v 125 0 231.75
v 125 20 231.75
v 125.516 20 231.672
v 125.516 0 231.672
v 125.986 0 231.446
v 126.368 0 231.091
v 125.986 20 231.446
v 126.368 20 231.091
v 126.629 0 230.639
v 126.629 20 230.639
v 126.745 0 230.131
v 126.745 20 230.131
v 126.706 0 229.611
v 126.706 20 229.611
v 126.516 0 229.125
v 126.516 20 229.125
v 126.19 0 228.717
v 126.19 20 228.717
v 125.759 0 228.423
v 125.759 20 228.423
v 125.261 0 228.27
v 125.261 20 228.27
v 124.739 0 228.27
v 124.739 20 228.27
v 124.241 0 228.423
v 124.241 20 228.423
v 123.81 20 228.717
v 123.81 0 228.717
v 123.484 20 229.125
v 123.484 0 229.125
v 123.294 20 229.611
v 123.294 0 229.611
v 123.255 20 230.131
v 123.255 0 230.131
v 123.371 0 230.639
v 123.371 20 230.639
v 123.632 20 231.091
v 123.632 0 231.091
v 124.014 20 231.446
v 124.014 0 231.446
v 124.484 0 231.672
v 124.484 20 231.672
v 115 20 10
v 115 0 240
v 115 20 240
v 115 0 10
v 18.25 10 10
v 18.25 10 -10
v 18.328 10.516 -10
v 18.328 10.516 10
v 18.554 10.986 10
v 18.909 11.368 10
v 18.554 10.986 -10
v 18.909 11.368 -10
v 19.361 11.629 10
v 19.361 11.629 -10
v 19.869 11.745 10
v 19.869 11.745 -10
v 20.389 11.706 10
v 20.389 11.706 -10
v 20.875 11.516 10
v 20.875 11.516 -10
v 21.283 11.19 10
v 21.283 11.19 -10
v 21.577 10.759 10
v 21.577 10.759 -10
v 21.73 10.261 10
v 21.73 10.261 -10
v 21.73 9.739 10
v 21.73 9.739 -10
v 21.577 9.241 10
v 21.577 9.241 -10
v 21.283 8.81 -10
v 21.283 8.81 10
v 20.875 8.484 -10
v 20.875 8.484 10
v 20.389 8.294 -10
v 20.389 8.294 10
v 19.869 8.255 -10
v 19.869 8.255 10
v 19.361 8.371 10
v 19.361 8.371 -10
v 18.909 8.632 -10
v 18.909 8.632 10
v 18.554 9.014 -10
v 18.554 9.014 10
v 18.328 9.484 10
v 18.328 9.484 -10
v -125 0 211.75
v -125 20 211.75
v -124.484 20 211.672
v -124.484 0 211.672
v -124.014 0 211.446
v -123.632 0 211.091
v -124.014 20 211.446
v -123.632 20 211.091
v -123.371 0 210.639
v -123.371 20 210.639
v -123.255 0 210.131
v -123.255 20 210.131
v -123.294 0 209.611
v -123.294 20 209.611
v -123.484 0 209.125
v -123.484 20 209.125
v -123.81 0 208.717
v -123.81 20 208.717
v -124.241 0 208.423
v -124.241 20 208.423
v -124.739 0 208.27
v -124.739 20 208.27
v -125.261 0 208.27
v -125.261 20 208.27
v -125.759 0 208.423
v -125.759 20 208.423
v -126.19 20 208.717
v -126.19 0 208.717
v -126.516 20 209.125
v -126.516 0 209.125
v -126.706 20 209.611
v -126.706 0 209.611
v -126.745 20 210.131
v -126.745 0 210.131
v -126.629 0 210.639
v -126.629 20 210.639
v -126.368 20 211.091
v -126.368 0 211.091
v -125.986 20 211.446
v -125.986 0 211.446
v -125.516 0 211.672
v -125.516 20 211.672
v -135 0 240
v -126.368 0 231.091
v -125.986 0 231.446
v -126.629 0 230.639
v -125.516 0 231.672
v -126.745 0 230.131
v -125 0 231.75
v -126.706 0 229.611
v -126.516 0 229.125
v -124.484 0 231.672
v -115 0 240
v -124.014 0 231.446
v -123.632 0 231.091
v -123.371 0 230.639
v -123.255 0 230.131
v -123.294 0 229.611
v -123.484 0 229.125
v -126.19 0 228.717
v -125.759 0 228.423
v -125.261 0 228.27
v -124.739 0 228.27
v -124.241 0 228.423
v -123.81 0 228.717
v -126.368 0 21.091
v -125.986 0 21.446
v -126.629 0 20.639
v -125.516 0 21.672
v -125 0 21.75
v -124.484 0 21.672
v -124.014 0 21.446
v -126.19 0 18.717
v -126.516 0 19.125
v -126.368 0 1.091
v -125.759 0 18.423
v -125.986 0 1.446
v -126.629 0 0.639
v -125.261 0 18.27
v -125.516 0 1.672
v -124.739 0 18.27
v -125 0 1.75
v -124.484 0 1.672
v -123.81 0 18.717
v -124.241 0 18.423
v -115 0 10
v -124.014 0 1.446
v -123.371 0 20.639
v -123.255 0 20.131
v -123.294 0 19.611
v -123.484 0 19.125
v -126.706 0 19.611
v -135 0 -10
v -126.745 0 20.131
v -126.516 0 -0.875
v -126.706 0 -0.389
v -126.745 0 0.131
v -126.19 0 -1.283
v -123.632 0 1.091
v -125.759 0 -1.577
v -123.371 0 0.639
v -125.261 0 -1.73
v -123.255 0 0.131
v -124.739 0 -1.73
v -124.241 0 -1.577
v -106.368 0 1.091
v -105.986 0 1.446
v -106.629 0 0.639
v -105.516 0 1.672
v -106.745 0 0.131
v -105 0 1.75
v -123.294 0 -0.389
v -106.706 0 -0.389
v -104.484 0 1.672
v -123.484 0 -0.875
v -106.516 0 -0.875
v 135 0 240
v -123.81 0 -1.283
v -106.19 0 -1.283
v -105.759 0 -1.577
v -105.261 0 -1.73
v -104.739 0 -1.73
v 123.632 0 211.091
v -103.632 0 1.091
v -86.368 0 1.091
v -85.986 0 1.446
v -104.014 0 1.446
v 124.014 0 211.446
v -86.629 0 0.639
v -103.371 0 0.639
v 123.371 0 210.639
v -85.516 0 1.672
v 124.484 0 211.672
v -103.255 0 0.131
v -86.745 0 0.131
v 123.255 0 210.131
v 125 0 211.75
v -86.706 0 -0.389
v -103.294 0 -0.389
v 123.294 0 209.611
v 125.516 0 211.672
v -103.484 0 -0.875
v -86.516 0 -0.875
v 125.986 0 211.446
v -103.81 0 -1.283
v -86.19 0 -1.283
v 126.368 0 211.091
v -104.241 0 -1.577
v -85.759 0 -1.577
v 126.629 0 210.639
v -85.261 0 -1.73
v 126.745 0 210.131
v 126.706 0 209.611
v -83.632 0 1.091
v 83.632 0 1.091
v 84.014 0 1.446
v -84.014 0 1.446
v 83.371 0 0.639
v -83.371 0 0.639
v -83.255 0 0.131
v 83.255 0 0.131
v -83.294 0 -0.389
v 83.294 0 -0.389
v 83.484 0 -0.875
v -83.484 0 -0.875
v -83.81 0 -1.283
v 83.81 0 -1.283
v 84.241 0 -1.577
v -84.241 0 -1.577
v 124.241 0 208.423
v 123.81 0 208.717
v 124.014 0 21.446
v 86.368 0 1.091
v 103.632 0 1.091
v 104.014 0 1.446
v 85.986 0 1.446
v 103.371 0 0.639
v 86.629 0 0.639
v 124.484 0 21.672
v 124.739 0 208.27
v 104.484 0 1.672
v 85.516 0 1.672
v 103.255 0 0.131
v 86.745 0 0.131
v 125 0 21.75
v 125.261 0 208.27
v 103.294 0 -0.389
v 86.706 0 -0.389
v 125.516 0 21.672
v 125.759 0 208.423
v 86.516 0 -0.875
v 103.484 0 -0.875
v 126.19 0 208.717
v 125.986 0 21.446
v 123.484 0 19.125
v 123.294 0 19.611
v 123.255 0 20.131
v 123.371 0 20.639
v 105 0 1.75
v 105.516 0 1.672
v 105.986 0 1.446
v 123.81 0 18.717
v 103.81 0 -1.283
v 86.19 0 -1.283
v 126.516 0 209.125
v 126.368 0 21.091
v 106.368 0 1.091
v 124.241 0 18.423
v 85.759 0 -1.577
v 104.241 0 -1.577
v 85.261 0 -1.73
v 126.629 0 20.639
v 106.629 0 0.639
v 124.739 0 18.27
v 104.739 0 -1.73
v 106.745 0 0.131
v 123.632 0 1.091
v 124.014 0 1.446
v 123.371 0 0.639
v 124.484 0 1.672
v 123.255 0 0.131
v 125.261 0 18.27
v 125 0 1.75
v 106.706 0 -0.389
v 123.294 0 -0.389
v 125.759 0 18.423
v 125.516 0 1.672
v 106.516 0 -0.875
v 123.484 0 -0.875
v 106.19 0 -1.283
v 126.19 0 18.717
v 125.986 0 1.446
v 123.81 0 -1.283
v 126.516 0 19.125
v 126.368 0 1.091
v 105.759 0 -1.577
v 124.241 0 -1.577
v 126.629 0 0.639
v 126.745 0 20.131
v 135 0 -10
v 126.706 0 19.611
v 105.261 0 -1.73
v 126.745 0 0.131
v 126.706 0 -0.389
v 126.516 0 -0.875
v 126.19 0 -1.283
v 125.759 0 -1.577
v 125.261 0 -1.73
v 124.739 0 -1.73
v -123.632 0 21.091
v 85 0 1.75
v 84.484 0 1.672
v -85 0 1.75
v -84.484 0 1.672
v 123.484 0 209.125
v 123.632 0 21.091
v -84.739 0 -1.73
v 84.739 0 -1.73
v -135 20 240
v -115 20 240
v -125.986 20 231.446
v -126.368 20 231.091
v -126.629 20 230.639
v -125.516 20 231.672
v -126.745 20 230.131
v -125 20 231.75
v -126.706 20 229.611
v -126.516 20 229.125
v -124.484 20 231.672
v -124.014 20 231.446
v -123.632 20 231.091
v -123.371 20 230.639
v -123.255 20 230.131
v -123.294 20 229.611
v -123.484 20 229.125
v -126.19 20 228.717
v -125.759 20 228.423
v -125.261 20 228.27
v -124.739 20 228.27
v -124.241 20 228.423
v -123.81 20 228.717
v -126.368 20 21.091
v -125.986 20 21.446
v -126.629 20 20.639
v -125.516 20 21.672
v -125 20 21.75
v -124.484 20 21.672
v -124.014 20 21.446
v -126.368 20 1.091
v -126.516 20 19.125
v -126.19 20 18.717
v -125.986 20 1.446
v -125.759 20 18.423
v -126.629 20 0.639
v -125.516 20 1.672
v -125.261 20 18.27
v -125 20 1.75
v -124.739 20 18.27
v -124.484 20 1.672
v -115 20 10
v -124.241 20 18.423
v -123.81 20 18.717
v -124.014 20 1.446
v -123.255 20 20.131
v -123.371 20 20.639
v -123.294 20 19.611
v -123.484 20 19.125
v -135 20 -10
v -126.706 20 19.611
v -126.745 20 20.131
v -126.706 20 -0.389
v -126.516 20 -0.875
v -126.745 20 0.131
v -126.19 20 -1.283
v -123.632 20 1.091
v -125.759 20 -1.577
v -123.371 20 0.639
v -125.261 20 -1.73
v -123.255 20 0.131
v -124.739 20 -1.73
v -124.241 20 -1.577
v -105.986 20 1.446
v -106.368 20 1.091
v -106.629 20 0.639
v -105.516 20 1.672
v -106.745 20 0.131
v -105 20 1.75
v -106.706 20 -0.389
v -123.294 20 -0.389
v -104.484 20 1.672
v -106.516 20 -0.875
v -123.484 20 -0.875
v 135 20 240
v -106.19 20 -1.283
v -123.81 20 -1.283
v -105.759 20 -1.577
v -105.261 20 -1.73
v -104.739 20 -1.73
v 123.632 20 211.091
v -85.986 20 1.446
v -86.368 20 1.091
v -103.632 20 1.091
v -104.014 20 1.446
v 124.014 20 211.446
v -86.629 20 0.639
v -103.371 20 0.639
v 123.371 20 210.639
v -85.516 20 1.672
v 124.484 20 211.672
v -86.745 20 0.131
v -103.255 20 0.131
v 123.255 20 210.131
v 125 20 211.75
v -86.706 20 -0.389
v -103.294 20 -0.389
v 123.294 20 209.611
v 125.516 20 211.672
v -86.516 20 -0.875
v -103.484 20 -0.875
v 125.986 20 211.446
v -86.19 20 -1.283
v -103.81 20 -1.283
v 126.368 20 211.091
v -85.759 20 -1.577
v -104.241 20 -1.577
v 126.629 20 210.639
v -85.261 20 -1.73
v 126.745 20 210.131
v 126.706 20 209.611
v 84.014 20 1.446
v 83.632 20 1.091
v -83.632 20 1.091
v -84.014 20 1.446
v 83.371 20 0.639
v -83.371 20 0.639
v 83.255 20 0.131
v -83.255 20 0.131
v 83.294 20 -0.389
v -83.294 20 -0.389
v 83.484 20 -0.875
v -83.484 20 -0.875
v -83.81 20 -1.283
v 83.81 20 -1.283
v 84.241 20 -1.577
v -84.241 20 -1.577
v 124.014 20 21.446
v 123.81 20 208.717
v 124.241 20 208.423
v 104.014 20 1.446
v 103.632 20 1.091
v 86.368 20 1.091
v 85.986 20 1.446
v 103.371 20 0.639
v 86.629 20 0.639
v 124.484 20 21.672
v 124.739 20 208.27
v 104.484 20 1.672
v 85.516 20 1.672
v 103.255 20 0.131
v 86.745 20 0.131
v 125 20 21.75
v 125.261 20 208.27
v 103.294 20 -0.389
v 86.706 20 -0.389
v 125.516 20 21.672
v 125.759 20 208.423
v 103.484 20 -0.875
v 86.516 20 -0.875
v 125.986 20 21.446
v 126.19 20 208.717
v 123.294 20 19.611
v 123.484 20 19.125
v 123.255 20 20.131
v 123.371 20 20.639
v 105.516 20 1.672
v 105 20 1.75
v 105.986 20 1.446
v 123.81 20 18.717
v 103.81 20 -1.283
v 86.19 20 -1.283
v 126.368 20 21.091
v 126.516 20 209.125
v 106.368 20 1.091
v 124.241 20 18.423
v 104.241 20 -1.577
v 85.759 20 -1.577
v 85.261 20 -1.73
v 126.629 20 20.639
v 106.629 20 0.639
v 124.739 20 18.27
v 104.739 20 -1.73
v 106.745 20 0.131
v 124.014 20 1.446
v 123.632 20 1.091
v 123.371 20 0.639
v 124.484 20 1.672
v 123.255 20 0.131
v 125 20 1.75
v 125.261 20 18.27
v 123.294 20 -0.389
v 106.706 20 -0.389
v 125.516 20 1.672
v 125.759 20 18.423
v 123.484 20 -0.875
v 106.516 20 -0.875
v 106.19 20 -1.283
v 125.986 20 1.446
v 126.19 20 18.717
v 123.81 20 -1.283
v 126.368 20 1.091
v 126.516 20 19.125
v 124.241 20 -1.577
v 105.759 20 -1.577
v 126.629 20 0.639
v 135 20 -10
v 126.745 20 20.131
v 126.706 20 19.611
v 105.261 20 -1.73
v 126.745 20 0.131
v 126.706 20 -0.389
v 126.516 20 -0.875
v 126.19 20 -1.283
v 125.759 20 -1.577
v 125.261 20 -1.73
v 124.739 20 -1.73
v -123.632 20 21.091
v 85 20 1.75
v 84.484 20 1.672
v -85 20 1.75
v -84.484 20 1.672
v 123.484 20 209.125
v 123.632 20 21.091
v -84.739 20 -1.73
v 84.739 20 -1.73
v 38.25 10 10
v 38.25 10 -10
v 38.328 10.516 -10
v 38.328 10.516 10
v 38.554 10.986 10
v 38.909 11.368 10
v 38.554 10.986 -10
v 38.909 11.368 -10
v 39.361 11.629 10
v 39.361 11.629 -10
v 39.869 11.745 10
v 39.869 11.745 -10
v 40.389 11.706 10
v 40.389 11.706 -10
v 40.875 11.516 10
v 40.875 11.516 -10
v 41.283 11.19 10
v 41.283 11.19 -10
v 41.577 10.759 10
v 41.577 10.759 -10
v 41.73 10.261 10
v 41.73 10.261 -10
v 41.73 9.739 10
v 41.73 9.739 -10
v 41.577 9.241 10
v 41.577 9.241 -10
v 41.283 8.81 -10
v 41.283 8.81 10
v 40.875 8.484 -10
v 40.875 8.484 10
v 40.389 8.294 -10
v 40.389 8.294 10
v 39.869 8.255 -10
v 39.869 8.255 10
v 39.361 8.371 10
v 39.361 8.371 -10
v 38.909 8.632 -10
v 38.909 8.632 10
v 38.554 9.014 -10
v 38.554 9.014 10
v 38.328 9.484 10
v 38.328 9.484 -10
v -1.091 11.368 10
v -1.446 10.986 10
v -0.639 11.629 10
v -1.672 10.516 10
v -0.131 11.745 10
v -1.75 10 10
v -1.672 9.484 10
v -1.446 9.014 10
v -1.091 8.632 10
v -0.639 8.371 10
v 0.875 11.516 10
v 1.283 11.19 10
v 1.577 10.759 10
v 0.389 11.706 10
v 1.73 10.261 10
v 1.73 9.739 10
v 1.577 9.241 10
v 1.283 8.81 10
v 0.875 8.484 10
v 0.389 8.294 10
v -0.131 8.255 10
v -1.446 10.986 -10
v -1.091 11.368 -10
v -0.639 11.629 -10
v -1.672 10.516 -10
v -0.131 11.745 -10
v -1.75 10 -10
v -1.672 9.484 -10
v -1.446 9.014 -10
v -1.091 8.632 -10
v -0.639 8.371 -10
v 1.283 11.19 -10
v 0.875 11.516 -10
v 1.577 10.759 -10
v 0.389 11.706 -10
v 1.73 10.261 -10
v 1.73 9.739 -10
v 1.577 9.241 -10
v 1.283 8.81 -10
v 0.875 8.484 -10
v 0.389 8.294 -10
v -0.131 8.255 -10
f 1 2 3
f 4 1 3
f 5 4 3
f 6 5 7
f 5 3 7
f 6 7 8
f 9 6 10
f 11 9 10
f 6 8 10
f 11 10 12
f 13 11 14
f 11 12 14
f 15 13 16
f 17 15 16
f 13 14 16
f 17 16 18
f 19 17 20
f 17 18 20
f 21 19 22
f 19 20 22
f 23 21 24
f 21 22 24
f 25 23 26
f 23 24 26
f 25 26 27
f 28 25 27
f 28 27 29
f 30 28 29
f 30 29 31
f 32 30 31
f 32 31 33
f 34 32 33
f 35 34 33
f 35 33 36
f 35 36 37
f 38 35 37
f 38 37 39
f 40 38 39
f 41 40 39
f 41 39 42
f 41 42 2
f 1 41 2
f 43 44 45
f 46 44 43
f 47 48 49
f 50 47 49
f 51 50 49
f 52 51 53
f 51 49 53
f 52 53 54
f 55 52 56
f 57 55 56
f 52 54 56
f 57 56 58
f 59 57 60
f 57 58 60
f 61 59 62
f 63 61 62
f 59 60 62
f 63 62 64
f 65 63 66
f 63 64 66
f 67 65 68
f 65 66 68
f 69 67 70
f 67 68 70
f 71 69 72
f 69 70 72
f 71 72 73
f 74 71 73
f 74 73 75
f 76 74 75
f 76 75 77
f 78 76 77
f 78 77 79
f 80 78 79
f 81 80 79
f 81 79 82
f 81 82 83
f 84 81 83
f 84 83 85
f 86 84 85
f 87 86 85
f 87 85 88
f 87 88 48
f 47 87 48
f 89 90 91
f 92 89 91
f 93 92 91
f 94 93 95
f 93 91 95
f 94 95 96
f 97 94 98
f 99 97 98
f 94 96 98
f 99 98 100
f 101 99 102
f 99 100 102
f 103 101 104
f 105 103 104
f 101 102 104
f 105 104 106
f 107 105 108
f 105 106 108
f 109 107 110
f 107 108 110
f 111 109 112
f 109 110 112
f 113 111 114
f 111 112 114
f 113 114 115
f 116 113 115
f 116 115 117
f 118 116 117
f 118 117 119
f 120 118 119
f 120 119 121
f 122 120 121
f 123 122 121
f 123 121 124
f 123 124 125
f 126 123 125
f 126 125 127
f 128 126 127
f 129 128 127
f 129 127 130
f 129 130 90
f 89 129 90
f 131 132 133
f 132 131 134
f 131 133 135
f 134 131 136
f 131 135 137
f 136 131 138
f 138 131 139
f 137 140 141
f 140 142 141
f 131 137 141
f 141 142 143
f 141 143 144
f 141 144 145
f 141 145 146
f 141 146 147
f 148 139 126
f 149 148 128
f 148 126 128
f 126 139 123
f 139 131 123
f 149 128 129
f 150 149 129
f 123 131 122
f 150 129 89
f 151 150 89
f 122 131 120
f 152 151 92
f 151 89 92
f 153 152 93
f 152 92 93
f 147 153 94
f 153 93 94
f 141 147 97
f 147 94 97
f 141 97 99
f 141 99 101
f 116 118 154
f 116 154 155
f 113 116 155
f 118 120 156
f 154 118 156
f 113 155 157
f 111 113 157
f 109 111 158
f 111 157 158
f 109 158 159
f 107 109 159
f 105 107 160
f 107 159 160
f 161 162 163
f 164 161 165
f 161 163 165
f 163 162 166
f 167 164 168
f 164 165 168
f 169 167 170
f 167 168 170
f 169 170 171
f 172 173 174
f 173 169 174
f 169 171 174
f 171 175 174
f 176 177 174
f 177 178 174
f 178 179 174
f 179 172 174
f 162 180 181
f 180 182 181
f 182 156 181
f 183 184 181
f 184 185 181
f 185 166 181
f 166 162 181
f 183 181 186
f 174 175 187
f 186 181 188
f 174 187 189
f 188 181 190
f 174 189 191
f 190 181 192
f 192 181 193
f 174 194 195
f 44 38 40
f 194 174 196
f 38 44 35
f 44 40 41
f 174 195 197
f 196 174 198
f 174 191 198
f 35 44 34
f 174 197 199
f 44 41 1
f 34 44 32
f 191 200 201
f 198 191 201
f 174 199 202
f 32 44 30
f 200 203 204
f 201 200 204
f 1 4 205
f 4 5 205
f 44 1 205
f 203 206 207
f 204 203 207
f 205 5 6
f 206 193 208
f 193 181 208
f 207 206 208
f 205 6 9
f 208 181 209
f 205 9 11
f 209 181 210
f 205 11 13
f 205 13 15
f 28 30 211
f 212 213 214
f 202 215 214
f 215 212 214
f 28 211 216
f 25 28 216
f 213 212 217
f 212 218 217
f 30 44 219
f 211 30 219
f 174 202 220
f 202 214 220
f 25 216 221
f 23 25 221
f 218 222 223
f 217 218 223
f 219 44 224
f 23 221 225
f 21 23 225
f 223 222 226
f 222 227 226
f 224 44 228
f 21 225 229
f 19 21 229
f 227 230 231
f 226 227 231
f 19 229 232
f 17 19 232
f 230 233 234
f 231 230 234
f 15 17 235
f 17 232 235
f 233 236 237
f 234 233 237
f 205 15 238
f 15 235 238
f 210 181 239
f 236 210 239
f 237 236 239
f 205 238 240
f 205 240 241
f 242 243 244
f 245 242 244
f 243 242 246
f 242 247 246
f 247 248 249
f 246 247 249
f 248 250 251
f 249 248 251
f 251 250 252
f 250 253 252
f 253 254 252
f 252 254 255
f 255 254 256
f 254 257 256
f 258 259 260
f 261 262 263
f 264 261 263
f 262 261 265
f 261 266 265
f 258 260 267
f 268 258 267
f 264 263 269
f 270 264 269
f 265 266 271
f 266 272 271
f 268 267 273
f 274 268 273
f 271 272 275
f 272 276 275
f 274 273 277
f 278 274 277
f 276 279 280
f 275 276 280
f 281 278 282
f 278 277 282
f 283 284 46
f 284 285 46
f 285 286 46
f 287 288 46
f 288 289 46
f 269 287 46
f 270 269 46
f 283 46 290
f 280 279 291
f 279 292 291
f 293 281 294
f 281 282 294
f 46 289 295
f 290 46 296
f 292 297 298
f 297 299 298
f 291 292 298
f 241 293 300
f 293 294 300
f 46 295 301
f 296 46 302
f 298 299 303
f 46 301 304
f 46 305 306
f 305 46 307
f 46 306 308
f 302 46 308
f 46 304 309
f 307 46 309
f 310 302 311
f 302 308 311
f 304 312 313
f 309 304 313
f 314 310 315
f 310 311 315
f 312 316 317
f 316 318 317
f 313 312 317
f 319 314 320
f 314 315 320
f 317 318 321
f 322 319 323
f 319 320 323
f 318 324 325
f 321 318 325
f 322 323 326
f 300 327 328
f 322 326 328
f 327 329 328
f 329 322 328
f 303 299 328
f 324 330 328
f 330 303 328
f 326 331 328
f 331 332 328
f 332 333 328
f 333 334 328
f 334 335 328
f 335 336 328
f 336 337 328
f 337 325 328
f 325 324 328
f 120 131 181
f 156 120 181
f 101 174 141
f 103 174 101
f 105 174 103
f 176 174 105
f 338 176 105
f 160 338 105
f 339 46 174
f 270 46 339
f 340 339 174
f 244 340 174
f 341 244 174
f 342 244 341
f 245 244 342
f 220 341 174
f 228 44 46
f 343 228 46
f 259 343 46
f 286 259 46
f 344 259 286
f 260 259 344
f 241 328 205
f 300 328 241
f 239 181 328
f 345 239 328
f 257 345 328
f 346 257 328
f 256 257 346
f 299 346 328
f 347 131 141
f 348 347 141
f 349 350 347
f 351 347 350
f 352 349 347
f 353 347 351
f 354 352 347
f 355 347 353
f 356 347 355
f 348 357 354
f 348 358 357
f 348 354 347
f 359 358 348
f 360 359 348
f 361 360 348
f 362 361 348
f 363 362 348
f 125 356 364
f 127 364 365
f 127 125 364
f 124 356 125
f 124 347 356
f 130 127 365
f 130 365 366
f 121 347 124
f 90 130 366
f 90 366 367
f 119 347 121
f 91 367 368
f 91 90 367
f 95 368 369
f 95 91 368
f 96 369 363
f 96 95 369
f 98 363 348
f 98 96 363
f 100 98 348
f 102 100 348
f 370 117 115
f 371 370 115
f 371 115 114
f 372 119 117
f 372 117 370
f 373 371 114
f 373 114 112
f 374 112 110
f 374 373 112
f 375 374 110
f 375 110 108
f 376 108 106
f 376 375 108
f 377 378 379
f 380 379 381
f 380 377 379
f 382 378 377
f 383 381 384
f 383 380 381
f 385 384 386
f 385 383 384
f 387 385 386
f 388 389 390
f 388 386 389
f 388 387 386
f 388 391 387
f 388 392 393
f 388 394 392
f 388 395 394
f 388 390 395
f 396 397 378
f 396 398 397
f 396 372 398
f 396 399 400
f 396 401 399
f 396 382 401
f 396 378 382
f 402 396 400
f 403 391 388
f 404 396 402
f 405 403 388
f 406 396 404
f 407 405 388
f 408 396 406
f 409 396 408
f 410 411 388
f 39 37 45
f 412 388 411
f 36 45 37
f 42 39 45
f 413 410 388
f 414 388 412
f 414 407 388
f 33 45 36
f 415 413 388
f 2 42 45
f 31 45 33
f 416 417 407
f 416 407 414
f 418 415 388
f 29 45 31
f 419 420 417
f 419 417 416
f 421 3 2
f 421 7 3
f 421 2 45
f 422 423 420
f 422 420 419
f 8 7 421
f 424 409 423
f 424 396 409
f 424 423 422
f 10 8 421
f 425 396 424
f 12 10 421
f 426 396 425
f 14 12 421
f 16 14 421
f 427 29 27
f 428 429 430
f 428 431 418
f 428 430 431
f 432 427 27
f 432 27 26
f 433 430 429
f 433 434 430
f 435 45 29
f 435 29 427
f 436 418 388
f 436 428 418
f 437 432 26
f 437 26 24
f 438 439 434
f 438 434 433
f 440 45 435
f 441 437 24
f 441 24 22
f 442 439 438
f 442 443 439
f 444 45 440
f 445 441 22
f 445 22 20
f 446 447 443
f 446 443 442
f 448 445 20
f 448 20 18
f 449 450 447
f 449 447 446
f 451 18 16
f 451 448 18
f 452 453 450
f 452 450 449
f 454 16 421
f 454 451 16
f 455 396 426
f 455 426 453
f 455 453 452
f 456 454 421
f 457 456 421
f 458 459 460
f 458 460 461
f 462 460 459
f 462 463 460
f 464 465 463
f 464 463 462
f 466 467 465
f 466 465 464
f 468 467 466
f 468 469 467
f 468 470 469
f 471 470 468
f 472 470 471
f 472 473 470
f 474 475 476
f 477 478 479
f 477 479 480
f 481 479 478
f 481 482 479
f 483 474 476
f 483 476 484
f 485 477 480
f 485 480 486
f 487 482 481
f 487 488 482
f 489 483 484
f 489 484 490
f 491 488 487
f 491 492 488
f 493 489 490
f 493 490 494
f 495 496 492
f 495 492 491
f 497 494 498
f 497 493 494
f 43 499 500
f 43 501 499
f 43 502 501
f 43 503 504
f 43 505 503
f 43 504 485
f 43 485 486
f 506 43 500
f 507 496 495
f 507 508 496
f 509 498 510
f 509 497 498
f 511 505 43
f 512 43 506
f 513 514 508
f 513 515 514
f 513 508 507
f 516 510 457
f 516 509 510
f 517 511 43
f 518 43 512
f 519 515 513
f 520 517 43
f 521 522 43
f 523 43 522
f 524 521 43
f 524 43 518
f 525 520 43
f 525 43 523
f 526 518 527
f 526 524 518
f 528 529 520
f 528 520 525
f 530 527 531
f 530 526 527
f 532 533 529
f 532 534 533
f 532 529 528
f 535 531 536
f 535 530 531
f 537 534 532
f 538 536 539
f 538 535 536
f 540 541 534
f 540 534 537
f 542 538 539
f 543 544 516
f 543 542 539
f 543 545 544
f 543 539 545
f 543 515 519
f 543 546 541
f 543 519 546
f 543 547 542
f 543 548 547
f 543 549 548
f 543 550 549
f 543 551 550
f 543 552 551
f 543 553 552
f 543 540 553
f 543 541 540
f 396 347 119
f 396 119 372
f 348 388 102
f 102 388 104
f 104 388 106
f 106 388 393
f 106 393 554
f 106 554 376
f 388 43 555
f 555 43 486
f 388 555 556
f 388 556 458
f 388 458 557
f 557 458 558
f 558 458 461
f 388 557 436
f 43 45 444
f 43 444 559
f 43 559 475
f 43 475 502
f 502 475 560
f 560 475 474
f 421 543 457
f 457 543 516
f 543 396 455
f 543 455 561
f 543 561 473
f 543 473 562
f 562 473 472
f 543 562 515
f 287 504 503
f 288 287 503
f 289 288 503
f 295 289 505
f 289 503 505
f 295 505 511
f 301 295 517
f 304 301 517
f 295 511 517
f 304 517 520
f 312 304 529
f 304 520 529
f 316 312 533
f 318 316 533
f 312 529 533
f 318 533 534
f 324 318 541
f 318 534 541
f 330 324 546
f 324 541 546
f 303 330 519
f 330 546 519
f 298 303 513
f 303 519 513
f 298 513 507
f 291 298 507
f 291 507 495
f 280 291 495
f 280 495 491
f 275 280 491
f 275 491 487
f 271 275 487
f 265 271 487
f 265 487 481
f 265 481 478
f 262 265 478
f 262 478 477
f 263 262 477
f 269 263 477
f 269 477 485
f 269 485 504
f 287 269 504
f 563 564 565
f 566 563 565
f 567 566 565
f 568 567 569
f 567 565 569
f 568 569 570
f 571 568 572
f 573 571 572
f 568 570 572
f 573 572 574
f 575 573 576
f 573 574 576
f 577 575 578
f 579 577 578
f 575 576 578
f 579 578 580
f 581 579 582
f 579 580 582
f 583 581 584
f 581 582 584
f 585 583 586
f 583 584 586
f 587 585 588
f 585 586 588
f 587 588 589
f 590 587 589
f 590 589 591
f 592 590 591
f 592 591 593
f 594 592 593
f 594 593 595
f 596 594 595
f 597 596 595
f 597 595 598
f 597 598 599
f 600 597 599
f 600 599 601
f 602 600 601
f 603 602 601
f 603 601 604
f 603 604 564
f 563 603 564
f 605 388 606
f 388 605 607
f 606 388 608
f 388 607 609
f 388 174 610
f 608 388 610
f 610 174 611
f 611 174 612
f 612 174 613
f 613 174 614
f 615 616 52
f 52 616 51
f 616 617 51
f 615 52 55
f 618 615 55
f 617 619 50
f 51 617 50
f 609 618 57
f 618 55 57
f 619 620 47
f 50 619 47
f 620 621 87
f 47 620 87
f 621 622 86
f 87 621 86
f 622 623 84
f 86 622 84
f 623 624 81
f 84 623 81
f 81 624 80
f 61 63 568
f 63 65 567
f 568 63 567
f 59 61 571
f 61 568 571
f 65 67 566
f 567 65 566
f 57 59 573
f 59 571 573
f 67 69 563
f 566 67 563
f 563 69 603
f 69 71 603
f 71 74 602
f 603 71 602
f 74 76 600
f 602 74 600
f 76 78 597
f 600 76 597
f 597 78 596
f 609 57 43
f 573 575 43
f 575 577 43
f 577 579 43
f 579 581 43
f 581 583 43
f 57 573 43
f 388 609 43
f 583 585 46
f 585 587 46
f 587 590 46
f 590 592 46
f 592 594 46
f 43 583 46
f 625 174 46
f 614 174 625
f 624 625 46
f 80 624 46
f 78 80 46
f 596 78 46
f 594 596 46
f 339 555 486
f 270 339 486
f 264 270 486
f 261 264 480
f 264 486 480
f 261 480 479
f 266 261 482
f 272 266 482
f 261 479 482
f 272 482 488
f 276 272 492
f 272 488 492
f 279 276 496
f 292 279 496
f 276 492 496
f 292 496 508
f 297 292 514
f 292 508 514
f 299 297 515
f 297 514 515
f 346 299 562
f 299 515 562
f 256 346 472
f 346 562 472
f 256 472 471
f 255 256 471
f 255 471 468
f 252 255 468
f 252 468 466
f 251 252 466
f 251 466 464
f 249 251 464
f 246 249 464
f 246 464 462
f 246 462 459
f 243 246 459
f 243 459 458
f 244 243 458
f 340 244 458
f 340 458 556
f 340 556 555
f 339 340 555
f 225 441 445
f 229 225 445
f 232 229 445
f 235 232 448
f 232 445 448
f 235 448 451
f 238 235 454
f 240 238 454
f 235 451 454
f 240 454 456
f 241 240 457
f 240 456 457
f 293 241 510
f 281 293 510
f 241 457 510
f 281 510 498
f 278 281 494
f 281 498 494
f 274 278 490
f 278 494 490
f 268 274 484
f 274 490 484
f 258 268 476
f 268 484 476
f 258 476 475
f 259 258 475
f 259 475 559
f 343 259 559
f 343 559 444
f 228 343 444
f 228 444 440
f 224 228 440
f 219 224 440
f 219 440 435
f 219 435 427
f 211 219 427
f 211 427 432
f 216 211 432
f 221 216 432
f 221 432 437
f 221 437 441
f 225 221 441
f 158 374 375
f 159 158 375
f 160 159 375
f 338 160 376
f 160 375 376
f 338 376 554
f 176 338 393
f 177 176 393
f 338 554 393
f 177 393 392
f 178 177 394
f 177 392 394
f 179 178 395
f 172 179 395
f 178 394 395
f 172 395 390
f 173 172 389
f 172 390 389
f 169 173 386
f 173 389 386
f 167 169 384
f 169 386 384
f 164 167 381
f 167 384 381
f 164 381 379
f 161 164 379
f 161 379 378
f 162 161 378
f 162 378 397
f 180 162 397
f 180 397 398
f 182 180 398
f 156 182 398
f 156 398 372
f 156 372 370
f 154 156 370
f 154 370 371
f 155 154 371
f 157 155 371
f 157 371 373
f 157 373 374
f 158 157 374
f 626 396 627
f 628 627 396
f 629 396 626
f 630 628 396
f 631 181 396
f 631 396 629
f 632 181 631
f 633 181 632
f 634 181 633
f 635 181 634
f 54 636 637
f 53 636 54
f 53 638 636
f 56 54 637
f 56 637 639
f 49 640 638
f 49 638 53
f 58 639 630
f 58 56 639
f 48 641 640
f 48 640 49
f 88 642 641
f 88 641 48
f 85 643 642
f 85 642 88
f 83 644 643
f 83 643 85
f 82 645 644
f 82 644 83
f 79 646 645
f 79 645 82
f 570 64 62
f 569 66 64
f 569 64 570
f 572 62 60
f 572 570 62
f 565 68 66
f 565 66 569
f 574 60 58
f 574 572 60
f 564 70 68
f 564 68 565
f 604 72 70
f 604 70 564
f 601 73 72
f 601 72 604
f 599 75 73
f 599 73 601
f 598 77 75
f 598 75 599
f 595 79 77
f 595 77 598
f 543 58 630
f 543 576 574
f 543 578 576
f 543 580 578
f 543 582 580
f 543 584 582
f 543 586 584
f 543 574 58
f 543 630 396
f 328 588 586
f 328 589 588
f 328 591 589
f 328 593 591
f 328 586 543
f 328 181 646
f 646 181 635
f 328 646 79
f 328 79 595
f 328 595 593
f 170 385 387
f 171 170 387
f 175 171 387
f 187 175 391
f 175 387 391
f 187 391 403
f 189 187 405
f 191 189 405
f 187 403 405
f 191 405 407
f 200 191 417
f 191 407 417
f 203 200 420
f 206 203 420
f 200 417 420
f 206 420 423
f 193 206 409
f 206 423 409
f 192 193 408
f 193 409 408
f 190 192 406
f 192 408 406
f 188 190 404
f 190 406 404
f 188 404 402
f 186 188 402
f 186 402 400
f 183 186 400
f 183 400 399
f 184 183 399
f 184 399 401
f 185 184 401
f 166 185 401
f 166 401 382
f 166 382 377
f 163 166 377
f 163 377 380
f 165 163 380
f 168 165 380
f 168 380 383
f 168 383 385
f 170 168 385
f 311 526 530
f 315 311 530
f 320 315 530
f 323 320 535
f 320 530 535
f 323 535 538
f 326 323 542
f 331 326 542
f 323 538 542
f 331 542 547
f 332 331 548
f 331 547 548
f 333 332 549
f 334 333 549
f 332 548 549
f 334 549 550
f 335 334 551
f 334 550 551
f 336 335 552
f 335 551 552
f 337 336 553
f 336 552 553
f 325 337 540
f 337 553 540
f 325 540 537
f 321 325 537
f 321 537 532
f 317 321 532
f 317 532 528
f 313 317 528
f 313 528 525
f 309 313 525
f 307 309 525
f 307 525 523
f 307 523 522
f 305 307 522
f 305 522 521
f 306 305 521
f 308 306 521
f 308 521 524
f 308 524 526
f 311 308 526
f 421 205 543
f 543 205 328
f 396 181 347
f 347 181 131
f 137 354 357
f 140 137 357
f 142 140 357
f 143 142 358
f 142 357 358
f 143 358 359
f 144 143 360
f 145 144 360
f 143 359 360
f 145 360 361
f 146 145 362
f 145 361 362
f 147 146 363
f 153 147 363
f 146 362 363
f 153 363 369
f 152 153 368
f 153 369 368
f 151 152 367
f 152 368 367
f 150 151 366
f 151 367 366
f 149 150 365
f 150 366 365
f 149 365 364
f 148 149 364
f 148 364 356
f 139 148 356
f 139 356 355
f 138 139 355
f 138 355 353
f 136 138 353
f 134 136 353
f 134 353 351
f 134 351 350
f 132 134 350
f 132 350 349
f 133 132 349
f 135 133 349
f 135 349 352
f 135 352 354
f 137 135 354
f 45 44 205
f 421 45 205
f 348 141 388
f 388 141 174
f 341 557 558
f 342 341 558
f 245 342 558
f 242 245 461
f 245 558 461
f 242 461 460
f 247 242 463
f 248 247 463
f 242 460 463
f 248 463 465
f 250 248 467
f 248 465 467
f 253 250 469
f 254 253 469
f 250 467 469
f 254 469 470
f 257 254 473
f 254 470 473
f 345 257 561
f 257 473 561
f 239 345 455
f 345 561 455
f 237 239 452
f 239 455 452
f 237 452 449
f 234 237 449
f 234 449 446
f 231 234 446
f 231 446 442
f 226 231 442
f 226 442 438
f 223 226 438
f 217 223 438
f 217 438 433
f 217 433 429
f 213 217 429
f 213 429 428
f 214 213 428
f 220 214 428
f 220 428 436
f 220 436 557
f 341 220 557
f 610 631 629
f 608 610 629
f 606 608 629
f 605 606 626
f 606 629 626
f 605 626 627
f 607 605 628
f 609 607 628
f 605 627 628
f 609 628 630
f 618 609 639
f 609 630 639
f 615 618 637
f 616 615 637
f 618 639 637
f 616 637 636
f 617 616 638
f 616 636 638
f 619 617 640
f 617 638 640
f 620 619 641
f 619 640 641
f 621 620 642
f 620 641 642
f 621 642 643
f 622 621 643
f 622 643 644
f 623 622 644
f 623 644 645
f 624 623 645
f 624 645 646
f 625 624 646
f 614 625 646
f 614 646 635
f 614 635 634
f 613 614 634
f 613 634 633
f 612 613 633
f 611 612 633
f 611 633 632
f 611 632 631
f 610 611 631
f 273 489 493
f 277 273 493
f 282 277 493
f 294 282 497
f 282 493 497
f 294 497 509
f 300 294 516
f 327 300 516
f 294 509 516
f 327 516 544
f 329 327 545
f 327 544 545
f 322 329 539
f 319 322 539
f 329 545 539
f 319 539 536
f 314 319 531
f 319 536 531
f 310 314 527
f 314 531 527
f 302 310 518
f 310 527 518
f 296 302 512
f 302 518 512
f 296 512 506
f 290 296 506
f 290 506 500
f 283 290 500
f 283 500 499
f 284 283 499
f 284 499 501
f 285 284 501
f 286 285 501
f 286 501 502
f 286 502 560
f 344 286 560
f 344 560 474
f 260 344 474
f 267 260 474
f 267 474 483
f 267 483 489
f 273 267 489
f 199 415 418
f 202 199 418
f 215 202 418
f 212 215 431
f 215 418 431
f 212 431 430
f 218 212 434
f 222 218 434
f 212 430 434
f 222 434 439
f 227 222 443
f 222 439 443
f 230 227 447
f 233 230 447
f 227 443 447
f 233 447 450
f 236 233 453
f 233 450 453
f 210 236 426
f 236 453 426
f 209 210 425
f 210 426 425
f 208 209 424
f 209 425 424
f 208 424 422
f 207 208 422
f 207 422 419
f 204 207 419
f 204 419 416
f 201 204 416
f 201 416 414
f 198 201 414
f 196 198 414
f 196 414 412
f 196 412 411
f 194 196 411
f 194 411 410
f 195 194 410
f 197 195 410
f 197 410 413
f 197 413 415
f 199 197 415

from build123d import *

# Parameters (mm, degrees)
SKETCH_1_W          = 270
SKETCH_1_H          = 20
SKETCH_1_W_2        = 20
SKETCH_1_H_2        = 230
EXTRUDE_1_DEPTH     = 20
CUT_EXTRUDE_1_REACH = 278.089
SKETCH_2_R          = 1.75
CUT_EXTRUDE_2_REACH = 286.825
SKETCH_3_R          = 1.75


with BuildPart() as part:
    # 草图1 → 凸台-拉伸1 (new body)
    with BuildSketch(Plane(origin=(0, 0, 0), x_dir=(1, 0, 0), z_dir=(0, 1, 0))):
        Rectangle(SKETCH_1_W, SKETCH_1_H)
        with Locations((-125, -125)):
            Rectangle(SKETCH_1_W_2, SKETCH_1_H_2)
        with Locations((125, -125)):
            Rectangle(SKETCH_1_W_2, SKETCH_1_H_2)
    extrude(amount=EXTRUDE_1_DEPTH)

    # 草图2 → 切除-拉伸1 (cut, up to next)
    with BuildSketch(Plane(origin=(0, 20, 0), x_dir=(1, 0, 0), z_dir=(0, 1, 0)), mode=Mode.PRIVATE) as cut_extrude_1_sk1:
        with Locations(Location((-125, 0, 0), (0, 0, 270))):
            Circle(SKETCH_2_R)
    cut_extrude_1_tool1 = extrude(cut_extrude_1_sk1.sketch, amount=-CUT_EXTRUDE_1_REACH, mode=Mode.PRIVATE) & part.part
    # 草图2 → 切除-拉伸1 (cut, up to next)
    with BuildSketch(Plane(origin=(0, 20, 0), x_dir=(1, 0, 0), z_dir=(0, 1, 0)), mode=Mode.PRIVATE) as cut_extrude_1_sk2:
        with Locations(Location((-125, -20, 0), (0, 0, 270))):
            Circle(SKETCH_2_R)
    cut_extrude_1_tool2 = extrude(cut_extrude_1_sk2.sketch, amount=-CUT_EXTRUDE_1_REACH, mode=Mode.PRIVATE) & part.part
    # 草图2 → 切除-拉伸1 (cut, up to next)
    with BuildSketch(Plane(origin=(0, 20, 0), x_dir=(1, 0, 0), z_dir=(0, 1, 0)), mode=Mode.PRIVATE) as cut_extrude_1_sk3:
        with Locations(Location((-105, 0, 0), (0, 0, 270))):
            Circle(SKETCH_2_R)
    cut_extrude_1_tool3 = extrude(cut_extrude_1_sk3.sketch, amount=-CUT_EXTRUDE_1_REACH, mode=Mode.PRIVATE) & part.part
    # 草图2 → 切除-拉伸1 (cut, up to next)
    with BuildSketch(Plane(origin=(0, 20, 0), x_dir=(1, 0, 0), z_dir=(0, 1, 0)), mode=Mode.PRIVATE) as cut_extrude_1_sk4:
        with Locations(Location((-125, -210, 0), (0, 0, 270))):
            Circle(SKETCH_2_R)
    cut_extrude_1_tool4 = extrude(cut_extrude_1_sk4.sketch, amount=-CUT_EXTRUDE_1_REACH, mode=Mode.PRIVATE) & part.part
    # 草图2 → 切除-拉伸1 (cut, up to next)
    with BuildSketch(Plane(origin=(0, 20, 0), x_dir=(1, 0, 0), z_dir=(0, 1, 0)), mode=Mode.PRIVATE) as cut_extrude_1_sk5:
        with Locations(Location((-125, -230, 0), (0, 0, 270))):
            Circle(SKETCH_2_R)
    cut_extrude_1_tool5 = extrude(cut_extrude_1_sk5.sketch, amount=-CUT_EXTRUDE_1_REACH, mode=Mode.PRIVATE) & part.part
    # 草图2 → 切除-拉伸1 (cut, up to next)
    with BuildSketch(Plane(origin=(0, 20, 0), x_dir=(1, 0, 0), z_dir=(0, 1, 0)), mode=Mode.PRIVATE) as cut_extrude_1_sk6:
        with Locations(Location((125, -210, 0), (0, 0, 270))):
            Circle(SKETCH_2_R)
    cut_extrude_1_tool6 = extrude(cut_extrude_1_sk6.sketch, amount=-CUT_EXTRUDE_1_REACH, mode=Mode.PRIVATE) & part.part
    # 草图2 → 切除-拉伸1 (cut, up to next)
    with BuildSketch(Plane(origin=(0, 20, 0), x_dir=(1, 0, 0), z_dir=(0, 1, 0)), mode=Mode.PRIVATE) as cut_extrude_1_sk7:
        with Locations(Location((125, -230, 0), (0, 0, 270))):
            Circle(SKETCH_2_R)
    cut_extrude_1_tool7 = extrude(cut_extrude_1_sk7.sketch, amount=-CUT_EXTRUDE_1_REACH, mode=Mode.PRIVATE) & part.part
    # 草图2 → 切除-拉伸1 (cut, up to next)
    with BuildSketch(Plane(origin=(0, 20, 0), x_dir=(1, 0, 0), z_dir=(0, 1, 0)), mode=Mode.PRIVATE) as cut_extrude_1_sk8:
        with Locations(Location((125, 0, 0), (0, 0, 270))):
            Circle(SKETCH_2_R)
    cut_extrude_1_tool8 = extrude(cut_extrude_1_sk8.sketch, amount=-CUT_EXTRUDE_1_REACH, mode=Mode.PRIVATE) & part.part
    # 草图2 → 切除-拉伸1 (cut, up to next)
    with BuildSketch(Plane(origin=(0, 20, 0), x_dir=(1, 0, 0), z_dir=(0, 1, 0)), mode=Mode.PRIVATE) as cut_extrude_1_sk9:
        with Locations(Location((125, -20, 0), (0, 0, 270))):
            Circle(SKETCH_2_R)
    cut_extrude_1_tool9 = extrude(cut_extrude_1_sk9.sketch, amount=-CUT_EXTRUDE_1_REACH, mode=Mode.PRIVATE) & part.part
    # 草图2 → 切除-拉伸1 (cut, up to next)
    with BuildSketch(Plane(origin=(0, 20, 0), x_dir=(1, 0, 0), z_dir=(0, 1, 0)), mode=Mode.PRIVATE) as cut_extrude_1_sk10:
        with Locations(Location((105, 0, 0), (0, 0, 270))):
            Circle(SKETCH_2_R)
    cut_extrude_1_tool10 = extrude(cut_extrude_1_sk10.sketch, amount=-CUT_EXTRUDE_1_REACH, mode=Mode.PRIVATE) & part.part
    # 草图2 → 切除-拉伸1 (cut, up to next)
    with BuildSketch(Plane(origin=(0, 20, 0), x_dir=(1, 0, 0), z_dir=(0, 1, 0)), mode=Mode.PRIVATE) as cut_extrude_1_sk11:
        with Locations(Location((85, 0, 0), (0, 0, 270))):
            Circle(SKETCH_2_R)
    cut_extrude_1_tool11 = extrude(cut_extrude_1_sk11.sketch, amount=-CUT_EXTRUDE_1_REACH, mode=Mode.PRIVATE) & part.part
    # 草图2 → 切除-拉伸1 (cut, up to next)
    with BuildSketch(Plane(origin=(0, 20, 0), x_dir=(1, 0, 0), z_dir=(0, 1, 0)), mode=Mode.PRIVATE) as cut_extrude_1_sk12:
        with Locations(Location((-85, 0, 0), (0, 0, 270))):
            Circle(SKETCH_2_R)
    cut_extrude_1_tool12 = extrude(cut_extrude_1_sk12.sketch, amount=-CUT_EXTRUDE_1_REACH, mode=Mode.PRIVATE) & part.part
    add(cut_extrude_1_tool1.solids().sort_by_distance((-125, 20, 0))[0], mode=Mode.SUBTRACT)
    add(cut_extrude_1_tool2.solids().sort_by_distance((-125, 20, 20))[0], mode=Mode.SUBTRACT)
    add(cut_extrude_1_tool3.solids().sort_by_distance((-105, 20, 0))[0], mode=Mode.SUBTRACT)
    add(cut_extrude_1_tool4.solids().sort_by_distance((-125, 20, 210))[0], mode=Mode.SUBTRACT)
    add(cut_extrude_1_tool5.solids().sort_by_distance((-125, 20, 230))[0], mode=Mode.SUBTRACT)
    add(cut_extrude_1_tool6.solids().sort_by_distance((125, 20, 210))[0], mode=Mode.SUBTRACT)
    add(cut_extrude_1_tool7.solids().sort_by_distance((125, 20, 230))[0], mode=Mode.SUBTRACT)
    add(cut_extrude_1_tool8.solids().sort_by_distance((125, 20, 0))[0], mode=Mode.SUBTRACT)
    add(cut_extrude_1_tool9.solids().sort_by_distance((125, 20, 20))[0], mode=Mode.SUBTRACT)
    add(cut_extrude_1_tool10.solids().sort_by_distance((105, 20, 0))[0], mode=Mode.SUBTRACT)
    add(cut_extrude_1_tool11.solids().sort_by_distance((85, 20, 0))[0], mode=Mode.SUBTRACT)
    add(cut_extrude_1_tool12.solids().sort_by_distance((-85, 20, 0))[0], mode=Mode.SUBTRACT)

    # 草图3 → 切除-拉伸2 (cut, up to next)
    with BuildSketch(Plane(origin=(0, 0, -10), x_dir=(-1, 0, 0), z_dir=(0, 0, -1)), mode=Mode.PRIVATE) as cut_extrude_2_sk1:
        with Locations((-20, 10)):
            Circle(SKETCH_3_R)
    cut_extrude_2_tool1 = extrude(cut_extrude_2_sk1.sketch, amount=-CUT_EXTRUDE_2_REACH, mode=Mode.PRIVATE) & part.part
    # 草图3 → 切除-拉伸2 (cut, up to next)
    with BuildSketch(Plane(origin=(0, 0, -10), x_dir=(-1, 0, 0), z_dir=(0, 0, -1)), mode=Mode.PRIVATE) as cut_extrude_2_sk2:
        with Locations((0, 10)):
            Circle(SKETCH_3_R)
    cut_extrude_2_tool2 = extrude(cut_extrude_2_sk2.sketch, amount=-CUT_EXTRUDE_2_REACH, mode=Mode.PRIVATE) & part.part
    # 草图3 → 切除-拉伸2 (cut, up to next)
    with BuildSketch(Plane(origin=(0, 0, -10), x_dir=(-1, 0, 0), z_dir=(0, 0, -1)), mode=Mode.PRIVATE) as cut_extrude_2_sk3:
        with Locations((-40, 10)):
            Circle(SKETCH_3_R)
    cut_extrude_2_tool3 = extrude(cut_extrude_2_sk3.sketch, amount=-CUT_EXTRUDE_2_REACH, mode=Mode.PRIVATE) & part.part
    add(cut_extrude_2_tool1.solids().sort_by_distance((20, 10, -10))[0], mode=Mode.SUBTRACT)
    add(cut_extrude_2_tool2.solids().sort_by_distance((0, 10, -10))[0], mode=Mode.SUBTRACT)
    add(cut_extrude_2_tool3.solids().sort_by_distance((40, 10, -10))[0], mode=Mode.SUBTRACT)


solid = part.part
